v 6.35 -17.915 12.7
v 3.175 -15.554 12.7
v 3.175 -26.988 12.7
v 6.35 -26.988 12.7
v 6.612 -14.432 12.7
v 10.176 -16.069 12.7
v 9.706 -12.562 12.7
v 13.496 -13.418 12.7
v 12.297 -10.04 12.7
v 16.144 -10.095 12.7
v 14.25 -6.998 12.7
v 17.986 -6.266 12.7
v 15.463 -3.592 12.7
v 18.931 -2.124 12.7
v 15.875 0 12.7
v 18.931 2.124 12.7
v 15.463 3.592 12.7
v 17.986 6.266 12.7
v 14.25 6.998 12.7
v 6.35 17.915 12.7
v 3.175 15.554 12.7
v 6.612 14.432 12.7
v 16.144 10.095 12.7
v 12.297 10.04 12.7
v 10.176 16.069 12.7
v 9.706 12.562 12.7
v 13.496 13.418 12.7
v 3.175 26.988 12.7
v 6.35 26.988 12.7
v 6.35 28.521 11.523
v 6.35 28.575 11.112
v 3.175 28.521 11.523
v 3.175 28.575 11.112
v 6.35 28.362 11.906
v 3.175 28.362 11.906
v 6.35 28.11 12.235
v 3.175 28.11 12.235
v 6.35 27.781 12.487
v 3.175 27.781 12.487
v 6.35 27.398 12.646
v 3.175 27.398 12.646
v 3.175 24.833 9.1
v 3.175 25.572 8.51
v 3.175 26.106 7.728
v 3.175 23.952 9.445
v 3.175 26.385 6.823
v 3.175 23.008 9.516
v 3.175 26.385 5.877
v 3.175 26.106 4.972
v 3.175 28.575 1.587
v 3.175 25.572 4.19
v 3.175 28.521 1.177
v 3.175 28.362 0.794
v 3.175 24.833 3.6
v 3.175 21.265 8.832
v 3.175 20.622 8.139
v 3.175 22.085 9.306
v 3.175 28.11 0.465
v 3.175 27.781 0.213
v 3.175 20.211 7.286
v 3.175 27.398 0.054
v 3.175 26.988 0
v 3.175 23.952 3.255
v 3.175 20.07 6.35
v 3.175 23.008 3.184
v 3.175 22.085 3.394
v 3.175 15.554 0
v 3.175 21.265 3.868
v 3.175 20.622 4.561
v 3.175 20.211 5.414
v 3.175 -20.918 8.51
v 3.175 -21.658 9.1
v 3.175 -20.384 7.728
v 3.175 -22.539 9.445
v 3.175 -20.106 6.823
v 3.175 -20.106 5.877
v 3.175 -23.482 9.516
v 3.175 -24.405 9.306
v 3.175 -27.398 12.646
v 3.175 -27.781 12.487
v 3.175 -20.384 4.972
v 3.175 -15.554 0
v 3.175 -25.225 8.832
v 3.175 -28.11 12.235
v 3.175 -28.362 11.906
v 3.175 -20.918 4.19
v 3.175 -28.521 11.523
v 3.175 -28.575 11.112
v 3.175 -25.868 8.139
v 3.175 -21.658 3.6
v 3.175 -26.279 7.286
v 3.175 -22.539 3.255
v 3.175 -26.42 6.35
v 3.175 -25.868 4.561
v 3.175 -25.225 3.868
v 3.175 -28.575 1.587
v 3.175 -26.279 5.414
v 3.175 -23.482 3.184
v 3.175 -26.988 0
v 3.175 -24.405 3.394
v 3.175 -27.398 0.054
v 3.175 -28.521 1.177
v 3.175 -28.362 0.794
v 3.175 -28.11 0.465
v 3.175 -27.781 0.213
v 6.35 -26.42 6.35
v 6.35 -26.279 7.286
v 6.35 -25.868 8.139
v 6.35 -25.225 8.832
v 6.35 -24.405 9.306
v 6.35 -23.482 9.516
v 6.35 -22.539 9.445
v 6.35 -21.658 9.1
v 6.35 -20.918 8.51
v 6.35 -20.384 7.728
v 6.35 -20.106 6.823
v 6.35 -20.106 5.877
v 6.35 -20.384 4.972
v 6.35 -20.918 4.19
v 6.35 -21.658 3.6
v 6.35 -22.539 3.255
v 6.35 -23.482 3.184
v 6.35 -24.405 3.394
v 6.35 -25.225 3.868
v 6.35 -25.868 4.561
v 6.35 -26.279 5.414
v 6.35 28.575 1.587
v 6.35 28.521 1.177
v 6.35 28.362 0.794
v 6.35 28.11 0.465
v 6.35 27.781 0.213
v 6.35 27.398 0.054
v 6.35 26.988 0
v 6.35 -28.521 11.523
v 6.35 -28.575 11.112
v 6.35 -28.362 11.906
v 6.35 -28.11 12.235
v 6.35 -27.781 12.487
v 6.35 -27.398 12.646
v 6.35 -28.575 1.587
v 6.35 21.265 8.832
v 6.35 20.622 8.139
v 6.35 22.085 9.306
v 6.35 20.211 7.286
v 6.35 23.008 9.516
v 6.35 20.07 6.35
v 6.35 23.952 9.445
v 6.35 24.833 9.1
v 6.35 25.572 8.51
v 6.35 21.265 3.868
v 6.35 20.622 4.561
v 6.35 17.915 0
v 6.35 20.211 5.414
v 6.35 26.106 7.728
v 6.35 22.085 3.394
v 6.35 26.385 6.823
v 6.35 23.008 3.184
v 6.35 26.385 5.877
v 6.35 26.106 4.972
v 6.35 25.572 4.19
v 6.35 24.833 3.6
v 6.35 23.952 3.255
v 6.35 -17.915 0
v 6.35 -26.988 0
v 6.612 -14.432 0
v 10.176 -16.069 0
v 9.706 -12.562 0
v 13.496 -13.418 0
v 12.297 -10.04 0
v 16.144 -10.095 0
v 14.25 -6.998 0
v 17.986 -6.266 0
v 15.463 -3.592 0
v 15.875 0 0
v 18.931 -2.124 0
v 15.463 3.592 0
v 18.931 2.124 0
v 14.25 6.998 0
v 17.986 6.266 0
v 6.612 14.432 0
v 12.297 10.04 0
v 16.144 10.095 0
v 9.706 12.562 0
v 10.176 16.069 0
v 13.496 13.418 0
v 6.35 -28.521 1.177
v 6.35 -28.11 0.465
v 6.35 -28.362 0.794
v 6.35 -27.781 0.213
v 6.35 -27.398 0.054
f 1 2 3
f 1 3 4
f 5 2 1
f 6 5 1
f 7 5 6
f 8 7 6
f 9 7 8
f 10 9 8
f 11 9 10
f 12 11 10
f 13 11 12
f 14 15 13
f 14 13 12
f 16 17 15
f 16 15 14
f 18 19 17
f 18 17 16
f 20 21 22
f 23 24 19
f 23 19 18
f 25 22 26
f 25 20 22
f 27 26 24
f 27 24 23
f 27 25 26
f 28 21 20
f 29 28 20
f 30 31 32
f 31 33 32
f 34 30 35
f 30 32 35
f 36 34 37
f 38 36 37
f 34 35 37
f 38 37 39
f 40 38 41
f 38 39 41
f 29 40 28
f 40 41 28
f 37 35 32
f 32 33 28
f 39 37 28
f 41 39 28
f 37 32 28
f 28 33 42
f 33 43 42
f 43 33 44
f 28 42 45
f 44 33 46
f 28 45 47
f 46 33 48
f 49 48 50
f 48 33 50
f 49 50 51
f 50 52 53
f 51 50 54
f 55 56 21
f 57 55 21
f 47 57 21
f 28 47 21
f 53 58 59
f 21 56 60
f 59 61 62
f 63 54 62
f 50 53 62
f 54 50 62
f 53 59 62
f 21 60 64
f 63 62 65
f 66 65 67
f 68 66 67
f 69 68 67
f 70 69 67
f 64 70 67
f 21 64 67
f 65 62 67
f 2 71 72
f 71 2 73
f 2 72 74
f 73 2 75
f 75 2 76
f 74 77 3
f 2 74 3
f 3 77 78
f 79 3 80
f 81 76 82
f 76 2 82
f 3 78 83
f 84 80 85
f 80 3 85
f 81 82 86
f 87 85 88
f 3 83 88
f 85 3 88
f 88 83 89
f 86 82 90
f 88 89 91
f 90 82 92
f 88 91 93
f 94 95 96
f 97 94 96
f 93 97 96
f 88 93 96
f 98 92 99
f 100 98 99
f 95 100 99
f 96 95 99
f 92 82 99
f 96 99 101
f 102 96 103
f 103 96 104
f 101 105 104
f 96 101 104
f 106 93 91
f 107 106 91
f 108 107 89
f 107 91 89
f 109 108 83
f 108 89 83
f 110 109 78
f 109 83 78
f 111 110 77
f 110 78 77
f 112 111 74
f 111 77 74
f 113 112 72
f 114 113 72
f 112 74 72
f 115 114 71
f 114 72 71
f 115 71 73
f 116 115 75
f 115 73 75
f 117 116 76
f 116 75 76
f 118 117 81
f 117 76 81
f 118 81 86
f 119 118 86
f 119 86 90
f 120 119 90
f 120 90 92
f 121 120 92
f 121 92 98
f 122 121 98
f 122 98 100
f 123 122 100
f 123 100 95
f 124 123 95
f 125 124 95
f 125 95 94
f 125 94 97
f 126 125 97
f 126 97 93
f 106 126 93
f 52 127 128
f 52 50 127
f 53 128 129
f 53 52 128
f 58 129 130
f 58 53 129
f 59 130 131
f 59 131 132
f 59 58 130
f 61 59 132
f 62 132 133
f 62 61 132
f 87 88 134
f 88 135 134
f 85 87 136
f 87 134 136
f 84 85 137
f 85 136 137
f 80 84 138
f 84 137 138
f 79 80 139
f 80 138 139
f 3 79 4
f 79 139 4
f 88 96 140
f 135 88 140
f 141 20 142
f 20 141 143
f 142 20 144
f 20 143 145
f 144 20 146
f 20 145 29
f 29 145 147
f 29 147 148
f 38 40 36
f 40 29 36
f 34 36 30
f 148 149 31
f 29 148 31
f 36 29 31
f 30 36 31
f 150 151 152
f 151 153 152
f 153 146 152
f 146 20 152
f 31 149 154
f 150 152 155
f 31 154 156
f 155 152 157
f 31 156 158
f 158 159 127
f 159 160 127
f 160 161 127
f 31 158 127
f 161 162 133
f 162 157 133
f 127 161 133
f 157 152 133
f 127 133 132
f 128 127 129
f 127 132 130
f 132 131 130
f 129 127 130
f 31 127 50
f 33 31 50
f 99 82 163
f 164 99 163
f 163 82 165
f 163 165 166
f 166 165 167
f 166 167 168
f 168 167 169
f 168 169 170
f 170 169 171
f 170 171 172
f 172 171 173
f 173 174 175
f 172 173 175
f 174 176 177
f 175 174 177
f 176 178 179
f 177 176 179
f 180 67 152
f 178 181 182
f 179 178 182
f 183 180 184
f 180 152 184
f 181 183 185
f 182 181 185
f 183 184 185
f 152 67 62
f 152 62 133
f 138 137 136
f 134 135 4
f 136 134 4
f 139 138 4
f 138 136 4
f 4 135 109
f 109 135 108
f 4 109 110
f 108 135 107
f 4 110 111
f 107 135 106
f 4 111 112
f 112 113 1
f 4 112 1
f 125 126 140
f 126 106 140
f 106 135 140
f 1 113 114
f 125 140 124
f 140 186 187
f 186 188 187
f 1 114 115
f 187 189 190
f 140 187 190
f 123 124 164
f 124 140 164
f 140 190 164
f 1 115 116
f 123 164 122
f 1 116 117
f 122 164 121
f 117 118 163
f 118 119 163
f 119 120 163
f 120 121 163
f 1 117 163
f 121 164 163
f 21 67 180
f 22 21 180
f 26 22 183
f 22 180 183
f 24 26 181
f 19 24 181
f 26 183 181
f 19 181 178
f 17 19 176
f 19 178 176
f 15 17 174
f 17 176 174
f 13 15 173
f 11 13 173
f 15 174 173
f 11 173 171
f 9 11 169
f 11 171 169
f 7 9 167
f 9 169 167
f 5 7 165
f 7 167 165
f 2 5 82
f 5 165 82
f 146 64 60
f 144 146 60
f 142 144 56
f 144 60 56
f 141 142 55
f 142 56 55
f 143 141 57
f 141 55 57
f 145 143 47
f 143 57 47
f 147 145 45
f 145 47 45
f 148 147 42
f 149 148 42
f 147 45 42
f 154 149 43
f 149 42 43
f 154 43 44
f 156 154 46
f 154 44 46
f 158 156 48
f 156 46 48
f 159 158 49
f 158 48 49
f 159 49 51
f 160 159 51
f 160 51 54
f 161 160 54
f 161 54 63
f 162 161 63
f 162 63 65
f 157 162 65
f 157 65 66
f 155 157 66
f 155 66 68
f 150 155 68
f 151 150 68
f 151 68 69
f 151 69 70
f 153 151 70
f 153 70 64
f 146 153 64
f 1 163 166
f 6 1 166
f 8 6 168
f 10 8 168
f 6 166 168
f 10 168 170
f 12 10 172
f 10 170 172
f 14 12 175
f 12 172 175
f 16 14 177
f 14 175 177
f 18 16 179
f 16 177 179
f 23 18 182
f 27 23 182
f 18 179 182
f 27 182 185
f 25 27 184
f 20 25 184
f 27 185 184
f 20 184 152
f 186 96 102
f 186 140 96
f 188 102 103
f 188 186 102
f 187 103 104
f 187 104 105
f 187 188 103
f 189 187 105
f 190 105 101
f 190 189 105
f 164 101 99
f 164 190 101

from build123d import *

# Parameters (mm, degrees)
F1_DEPTH = 12.7
F2_R     = 1.5875
F4_D     = 6.35


with BuildPart() as f1:
    # F0 (on Top) → F1 (new body)
    with BuildSketch(Plane.XY):
        with BuildLine():
            ThreePointArc((3.175, 15.5542598667), (15.875, 0), (3.175, -15.5542598667))
            Line((3.175, -15.5542598667), (3.175, -18.7292598667))
            ThreePointArc((3.175, -18.7292598667), (4.7801025689, -18.3908223826), (6.35, -17.9150953144))
            ThreePointArc((6.35, -17.9150953144), (19.05, 0), (6.35, 17.9150953144))
            ThreePointArc((6.35, 17.9150953144), (4.7801025689, 18.3908223826), (3.175, 18.7292598667))
            Line((3.175, 18.7292598667), (3.175, 15.5542598667))
        make_face()
        with BuildLine():
            Line((3.175, 28.575), (3.175, 18.7292598667))
            ThreePointArc((3.175, 18.7292598667), (4.7801025689, 18.3908223826), (6.35, 17.9150953144))
            Line((6.35, 17.9150953144), (6.35, 28.575))
            Line((6.35, 28.575), (3.175, 28.575))
        make_face()
        with BuildLine():
            ThreePointArc((6.35, -17.9150953144), (4.7801025689, -18.3908223826), (3.175, -18.7292598667))
            Line((3.175, -18.7292598667), (3.175, -28.575))
            Line((3.175, -28.575), (6.35, -28.575))
            Line((6.35, -28.575), (6.35, -17.9150953144))
        make_face()
    extrude(amount=F1_DEPTH)

    # F2
    f2_edges = [f1.edges().sort_by_distance(p)[0] for p in [
        (4.7625, 28.575, 12.7),
        (4.7625, 28.575, 0),
        (4.7625, -28.575, 0),
        (4.7625, -28.575, 12.7),
    ]]
    fillet(f2_edges, radius=F2_R)

    # F4 (through all)
    with Locations(Plane.YZ.offset(6.35)):
        with Locations((-23.2450476572, 6.35), (23.2450476572, 6.35)):
            Hole(F4_D / 2)


solid = f1.part
